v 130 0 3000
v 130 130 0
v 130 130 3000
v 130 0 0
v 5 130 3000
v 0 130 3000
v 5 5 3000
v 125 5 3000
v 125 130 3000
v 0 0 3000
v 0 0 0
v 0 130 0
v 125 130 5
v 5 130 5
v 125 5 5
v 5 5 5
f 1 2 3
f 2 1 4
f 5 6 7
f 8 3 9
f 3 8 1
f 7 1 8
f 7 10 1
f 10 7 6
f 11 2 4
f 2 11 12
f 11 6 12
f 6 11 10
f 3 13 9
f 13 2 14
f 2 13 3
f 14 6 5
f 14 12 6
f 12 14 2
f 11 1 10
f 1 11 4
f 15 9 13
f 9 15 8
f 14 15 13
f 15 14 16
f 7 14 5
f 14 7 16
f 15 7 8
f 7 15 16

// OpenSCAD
module shaft(height, cabin_width, cabin_depth, thickness) {
  double_thickness = thickness * 2;
  quad_thickness = double_thickness * 2;

  difference() {
    cube([cabin_width + quad_thickness, cabin_depth + quad_thickness, height]);

    translate([thickness, thickness, thickness])
    cube([cabin_width + double_thickness, cabin_depth + quad_thickness, height]);
  }
}

  cabin_height = 300;
  cabin_width = 110;
  cabin_depth = 110;

  shaft_height = 3000;
  
  thickness = 5;

  union() {
    shaft(shaft_height, cabin_width, cabin_depth, thickness);
  }
